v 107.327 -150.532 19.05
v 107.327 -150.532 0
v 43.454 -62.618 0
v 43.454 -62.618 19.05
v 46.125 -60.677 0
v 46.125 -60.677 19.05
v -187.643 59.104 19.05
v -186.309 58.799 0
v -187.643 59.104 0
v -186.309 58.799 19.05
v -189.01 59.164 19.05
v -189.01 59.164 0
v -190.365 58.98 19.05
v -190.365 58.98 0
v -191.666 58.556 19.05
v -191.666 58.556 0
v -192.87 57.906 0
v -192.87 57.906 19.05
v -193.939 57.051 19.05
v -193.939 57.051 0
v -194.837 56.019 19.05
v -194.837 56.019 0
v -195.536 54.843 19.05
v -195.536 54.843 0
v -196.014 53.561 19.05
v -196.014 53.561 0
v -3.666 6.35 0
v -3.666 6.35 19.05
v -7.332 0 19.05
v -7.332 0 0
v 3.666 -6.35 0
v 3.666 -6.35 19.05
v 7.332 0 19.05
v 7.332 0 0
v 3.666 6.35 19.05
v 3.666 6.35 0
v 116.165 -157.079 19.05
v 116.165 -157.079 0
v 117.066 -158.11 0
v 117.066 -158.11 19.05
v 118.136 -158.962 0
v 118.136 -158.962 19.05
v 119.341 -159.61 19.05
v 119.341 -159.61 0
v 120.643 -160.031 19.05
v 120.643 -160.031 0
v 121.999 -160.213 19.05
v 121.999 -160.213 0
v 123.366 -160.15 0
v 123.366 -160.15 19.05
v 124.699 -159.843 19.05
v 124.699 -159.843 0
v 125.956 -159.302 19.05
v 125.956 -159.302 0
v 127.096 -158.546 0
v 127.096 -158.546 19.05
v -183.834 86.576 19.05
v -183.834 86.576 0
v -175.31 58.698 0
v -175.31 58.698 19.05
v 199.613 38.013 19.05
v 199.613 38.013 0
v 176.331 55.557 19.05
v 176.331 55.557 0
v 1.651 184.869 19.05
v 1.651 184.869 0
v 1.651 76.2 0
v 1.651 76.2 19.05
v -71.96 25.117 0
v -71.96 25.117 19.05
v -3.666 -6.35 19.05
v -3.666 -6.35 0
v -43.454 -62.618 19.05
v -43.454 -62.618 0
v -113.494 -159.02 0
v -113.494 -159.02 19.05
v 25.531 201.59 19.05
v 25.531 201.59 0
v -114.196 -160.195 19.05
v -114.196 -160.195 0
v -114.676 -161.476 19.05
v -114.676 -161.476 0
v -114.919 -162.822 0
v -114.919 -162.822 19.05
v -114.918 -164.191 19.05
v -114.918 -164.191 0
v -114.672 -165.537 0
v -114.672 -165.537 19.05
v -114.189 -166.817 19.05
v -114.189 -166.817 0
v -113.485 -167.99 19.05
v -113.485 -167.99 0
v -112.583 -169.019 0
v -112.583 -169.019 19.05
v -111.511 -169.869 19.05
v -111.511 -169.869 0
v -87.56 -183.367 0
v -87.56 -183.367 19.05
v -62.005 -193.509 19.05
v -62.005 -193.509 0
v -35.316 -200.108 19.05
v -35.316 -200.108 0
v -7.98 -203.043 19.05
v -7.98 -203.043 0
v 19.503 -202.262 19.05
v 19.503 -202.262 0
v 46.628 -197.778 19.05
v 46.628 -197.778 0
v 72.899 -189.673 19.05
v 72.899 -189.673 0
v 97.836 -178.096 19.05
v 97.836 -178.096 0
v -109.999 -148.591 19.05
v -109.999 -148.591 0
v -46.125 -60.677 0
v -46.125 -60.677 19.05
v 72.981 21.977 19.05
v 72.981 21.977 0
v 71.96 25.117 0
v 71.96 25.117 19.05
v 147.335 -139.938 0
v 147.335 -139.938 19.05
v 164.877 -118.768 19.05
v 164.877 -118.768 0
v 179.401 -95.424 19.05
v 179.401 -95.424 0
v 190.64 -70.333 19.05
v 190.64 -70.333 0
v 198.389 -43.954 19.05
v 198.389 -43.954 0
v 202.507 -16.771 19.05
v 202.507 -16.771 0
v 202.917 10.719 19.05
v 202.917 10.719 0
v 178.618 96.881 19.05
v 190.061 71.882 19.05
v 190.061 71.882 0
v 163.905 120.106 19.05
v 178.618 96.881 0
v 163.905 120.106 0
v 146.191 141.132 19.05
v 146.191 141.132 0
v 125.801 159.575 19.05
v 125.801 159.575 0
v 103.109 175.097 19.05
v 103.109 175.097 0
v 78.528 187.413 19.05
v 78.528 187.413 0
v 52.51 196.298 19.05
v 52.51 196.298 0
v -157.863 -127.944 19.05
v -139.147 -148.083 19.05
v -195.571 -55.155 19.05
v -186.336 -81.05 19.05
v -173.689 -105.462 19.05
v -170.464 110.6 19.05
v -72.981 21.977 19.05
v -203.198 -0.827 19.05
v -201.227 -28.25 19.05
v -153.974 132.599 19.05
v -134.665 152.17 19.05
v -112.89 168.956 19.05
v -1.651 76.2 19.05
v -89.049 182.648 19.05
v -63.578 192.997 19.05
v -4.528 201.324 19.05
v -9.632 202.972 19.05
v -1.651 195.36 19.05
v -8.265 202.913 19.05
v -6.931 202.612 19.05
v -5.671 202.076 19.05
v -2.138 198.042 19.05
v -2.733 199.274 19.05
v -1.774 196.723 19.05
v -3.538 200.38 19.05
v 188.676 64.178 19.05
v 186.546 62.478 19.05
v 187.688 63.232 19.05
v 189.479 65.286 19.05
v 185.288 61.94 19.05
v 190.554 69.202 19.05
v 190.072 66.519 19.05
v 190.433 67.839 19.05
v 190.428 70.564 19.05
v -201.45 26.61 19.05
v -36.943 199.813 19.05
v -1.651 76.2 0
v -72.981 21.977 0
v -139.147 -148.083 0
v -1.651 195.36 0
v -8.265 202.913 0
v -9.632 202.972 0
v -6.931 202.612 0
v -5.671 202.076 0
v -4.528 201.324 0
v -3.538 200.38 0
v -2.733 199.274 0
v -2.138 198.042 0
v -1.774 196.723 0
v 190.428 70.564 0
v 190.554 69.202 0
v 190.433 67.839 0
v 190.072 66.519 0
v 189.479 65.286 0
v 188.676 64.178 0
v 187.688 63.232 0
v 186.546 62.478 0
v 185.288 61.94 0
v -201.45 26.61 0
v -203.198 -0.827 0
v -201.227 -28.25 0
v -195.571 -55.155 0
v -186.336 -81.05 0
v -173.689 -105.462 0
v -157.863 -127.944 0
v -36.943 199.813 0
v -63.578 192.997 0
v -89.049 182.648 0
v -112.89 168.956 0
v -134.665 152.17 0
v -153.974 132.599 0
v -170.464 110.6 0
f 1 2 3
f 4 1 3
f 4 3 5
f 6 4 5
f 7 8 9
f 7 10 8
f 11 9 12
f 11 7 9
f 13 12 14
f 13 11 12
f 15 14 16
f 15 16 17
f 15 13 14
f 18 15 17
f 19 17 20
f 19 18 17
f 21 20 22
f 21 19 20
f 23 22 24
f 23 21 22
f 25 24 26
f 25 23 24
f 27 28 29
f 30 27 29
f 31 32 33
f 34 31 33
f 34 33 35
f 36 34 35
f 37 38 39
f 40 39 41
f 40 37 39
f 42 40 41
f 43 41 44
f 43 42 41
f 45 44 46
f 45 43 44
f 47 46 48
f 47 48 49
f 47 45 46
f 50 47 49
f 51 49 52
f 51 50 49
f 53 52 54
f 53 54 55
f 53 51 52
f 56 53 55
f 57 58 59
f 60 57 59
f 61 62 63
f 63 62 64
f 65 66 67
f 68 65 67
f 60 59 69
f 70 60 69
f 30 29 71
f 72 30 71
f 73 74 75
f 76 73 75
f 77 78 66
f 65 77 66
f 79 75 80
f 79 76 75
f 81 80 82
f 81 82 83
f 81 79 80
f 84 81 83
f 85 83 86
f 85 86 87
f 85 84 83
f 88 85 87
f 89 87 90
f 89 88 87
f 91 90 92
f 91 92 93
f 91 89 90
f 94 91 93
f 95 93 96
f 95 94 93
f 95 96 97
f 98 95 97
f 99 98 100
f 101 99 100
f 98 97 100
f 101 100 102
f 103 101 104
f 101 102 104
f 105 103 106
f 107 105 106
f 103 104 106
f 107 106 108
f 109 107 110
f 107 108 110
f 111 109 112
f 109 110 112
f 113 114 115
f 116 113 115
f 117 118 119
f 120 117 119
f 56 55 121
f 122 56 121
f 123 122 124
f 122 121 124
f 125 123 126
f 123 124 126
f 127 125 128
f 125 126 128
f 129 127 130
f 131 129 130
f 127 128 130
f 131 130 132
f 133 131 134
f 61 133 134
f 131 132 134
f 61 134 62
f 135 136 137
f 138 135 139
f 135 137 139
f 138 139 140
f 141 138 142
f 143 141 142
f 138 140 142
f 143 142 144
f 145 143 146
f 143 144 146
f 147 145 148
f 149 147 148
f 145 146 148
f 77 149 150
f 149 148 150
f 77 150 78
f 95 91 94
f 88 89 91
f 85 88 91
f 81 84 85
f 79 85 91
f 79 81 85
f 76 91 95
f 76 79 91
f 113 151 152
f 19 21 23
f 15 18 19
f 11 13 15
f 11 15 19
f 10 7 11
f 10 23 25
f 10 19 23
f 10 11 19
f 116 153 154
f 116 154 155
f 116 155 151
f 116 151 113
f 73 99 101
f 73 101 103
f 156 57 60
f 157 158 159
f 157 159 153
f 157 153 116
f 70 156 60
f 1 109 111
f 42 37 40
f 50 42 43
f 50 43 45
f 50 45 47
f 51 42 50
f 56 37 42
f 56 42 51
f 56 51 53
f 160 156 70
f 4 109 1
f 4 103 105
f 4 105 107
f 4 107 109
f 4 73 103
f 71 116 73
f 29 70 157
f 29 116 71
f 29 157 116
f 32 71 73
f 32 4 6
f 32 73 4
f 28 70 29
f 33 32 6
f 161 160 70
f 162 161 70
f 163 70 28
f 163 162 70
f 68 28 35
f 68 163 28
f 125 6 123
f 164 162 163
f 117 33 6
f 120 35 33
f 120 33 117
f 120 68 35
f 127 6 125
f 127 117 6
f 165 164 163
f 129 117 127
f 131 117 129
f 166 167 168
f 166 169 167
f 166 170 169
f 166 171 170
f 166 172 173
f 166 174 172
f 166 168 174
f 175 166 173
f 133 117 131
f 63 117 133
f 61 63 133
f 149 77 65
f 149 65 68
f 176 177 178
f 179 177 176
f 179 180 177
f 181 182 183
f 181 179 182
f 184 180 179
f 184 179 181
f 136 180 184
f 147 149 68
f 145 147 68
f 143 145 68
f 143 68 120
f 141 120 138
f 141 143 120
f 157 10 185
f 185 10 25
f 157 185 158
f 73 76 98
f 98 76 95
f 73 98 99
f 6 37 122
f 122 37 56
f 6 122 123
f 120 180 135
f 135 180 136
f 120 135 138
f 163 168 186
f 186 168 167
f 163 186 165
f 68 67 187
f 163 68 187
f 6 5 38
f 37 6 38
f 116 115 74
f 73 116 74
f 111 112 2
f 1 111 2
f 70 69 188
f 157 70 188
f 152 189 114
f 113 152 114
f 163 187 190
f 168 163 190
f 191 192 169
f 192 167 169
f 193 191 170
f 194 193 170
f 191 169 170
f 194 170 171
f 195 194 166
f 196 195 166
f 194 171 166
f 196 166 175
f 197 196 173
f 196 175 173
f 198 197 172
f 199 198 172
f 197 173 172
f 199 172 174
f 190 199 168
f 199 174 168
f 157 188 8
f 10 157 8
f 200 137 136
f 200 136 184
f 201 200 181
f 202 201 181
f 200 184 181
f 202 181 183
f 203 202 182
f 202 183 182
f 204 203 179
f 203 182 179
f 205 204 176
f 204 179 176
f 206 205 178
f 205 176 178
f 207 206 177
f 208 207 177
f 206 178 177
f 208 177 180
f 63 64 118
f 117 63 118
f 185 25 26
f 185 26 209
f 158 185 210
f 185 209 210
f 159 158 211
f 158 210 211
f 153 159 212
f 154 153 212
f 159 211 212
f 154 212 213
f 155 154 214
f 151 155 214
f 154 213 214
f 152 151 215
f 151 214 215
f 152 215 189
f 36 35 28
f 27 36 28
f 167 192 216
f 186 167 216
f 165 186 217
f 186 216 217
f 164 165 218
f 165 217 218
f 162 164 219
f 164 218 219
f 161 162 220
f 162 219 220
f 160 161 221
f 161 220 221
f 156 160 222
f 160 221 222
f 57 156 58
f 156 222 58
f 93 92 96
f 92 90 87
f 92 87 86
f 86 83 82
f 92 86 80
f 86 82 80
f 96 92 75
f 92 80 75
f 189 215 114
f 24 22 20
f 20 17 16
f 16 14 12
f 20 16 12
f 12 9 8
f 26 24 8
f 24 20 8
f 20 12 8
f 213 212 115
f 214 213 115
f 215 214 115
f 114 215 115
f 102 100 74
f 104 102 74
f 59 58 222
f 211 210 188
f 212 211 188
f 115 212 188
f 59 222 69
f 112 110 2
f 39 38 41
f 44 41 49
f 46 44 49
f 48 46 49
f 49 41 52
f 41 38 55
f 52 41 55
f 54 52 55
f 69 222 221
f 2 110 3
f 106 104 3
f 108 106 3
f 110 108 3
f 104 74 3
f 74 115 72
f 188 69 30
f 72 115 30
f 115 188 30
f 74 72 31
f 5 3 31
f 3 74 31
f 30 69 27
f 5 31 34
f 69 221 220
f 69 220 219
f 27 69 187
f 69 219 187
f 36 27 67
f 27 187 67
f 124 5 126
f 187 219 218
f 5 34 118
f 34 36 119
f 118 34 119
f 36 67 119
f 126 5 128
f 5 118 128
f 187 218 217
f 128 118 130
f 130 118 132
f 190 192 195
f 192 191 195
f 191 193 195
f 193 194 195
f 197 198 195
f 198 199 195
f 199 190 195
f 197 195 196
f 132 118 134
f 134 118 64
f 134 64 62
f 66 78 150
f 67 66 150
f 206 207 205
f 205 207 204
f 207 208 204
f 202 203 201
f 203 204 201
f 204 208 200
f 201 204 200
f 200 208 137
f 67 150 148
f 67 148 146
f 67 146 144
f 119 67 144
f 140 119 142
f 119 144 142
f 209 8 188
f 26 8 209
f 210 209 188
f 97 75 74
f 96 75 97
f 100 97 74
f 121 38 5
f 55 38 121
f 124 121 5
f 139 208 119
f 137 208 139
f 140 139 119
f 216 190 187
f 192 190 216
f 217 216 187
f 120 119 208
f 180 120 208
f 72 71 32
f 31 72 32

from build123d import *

# Parameters (mm, degrees)
F1_DEPTH = 19.05
F3_DEPTH = 19.05
F4_R     = 7.62


# Not quite as in the source:
# - a length typed as a fraction of an inch, garbled in the dataset ("3 / 203.2 mm" for 3/8 in), is restored


with BuildPart() as f1:
    # F0 (on Top) → F1 (new body)
    with BuildSketch(Plane.XY):
        with BuildLine():
            Line((-72.9806935994, 21.976900663), (-193.7584921492, 61.2199862795))
            ThreePointArc((-193.7584921492, 61.2199862795), (-196.6172683272, -51.3019472882), (-139.1466642939, -148.0825641859))
            Line((-139.1466642939, -148.0825641859), (-109.9986790571, -148.5913441608))
            Line((-109.9986790571, -148.5913441608), (-46.1249232824, -60.6766615198))
            Line((-46.1249232824, -60.6766615198), (-43.453549167, -62.6175284229))
            Line((-43.453549167, -62.6175284229), (-118.0983337572, -165.3572603903))
            ThreePointArc((-118.0983337572, -165.3572603903), (-11.9670260336, -202.8473078153), (97.8362036413, -178.0963707015))
            Line((97.8362036413, -178.0963707015), (107.3273049417, -150.5322110638))
            Line((107.3273049417, -150.5322110638), (43.453549167, -62.6175284229))
            Line((43.453549167, -62.6175284229), (46.1249232824, -60.6766615198))
            Line((46.1249232824, -60.6766615198), (120.7697078726, -163.4163934872))
            ThreePointArc((120.7697078726, -163.4163934872), (189.2212394942, -74.064583468), (199.6127634745, 38.0129538194))
            Line((199.6127634745, 38.0129538194), (176.330601432, 55.5573213216))
            Line((176.330601432, 55.5573213216), (72.9806935994, 21.976900663))
            Line((72.9806935994, 21.976900663), (71.960319484, 25.1172892798))
            Line((71.960319484, 25.1172892798), (192.7381180338, 64.3603748963))
            ThreePointArc((192.7381180338, 64.3603748963), (128.9121834343, 157.0728778695), (25.5312687742, 201.5896681747))
            Line((25.5312687742, 201.5896681747), (1.651, 184.8685239645))
            Line((1.651, 184.8685239645), (1.651, 76.2))
            Line((1.651, 76.2), (-1.651, 76.2))
            Line((-1.651, 76.2), (-1.651, 203.1932927018))
            ThreePointArc((-1.651, 203.1932927018), (-109.5491285678, 171.1409607021), (-183.8335715961, 86.5763128934))
            Line((-183.8335715961, 86.5763128934), (-175.3102273166, 58.6977099385))
            Line((-175.3102273166, 58.6977099385), (-71.960319484, 25.1172892798))
            Line((-71.960319484, 25.1172892798), (-72.9806935994, 21.976900663))
        make_face()
    extrude(amount=F1_DEPTH)

    # F2 (on face) → F3 (cut, through all)
    with BuildSketch(Plane.XY.offset(19.05)):
        Polygon((3.6661742094, 6.35), (-3.6661742094, 6.35), (-7.3323484187, 0), (-3.6661742094, -6.35), (3.6661742094, -6.35), (7.3323484187, 0), align=None)
    extrude(amount=-F3_DEPTH, mode=Mode.SUBTRACT)

    # F4
    f4_edges = [f1.edges().sort_by_distance(p)[0] for p in [
        (-193.758492, 61.219986, 9.525),
        (-1.651, 203.193293, 9.525),
        (192.738118, 64.360375, 9.525),
        (120.769708, -163.416393, 9.525),
        (-118.098334, -165.35726, 9.525),
    ]]
    fillet(f4_edges, radius=F4_R)


solid = f1.part
